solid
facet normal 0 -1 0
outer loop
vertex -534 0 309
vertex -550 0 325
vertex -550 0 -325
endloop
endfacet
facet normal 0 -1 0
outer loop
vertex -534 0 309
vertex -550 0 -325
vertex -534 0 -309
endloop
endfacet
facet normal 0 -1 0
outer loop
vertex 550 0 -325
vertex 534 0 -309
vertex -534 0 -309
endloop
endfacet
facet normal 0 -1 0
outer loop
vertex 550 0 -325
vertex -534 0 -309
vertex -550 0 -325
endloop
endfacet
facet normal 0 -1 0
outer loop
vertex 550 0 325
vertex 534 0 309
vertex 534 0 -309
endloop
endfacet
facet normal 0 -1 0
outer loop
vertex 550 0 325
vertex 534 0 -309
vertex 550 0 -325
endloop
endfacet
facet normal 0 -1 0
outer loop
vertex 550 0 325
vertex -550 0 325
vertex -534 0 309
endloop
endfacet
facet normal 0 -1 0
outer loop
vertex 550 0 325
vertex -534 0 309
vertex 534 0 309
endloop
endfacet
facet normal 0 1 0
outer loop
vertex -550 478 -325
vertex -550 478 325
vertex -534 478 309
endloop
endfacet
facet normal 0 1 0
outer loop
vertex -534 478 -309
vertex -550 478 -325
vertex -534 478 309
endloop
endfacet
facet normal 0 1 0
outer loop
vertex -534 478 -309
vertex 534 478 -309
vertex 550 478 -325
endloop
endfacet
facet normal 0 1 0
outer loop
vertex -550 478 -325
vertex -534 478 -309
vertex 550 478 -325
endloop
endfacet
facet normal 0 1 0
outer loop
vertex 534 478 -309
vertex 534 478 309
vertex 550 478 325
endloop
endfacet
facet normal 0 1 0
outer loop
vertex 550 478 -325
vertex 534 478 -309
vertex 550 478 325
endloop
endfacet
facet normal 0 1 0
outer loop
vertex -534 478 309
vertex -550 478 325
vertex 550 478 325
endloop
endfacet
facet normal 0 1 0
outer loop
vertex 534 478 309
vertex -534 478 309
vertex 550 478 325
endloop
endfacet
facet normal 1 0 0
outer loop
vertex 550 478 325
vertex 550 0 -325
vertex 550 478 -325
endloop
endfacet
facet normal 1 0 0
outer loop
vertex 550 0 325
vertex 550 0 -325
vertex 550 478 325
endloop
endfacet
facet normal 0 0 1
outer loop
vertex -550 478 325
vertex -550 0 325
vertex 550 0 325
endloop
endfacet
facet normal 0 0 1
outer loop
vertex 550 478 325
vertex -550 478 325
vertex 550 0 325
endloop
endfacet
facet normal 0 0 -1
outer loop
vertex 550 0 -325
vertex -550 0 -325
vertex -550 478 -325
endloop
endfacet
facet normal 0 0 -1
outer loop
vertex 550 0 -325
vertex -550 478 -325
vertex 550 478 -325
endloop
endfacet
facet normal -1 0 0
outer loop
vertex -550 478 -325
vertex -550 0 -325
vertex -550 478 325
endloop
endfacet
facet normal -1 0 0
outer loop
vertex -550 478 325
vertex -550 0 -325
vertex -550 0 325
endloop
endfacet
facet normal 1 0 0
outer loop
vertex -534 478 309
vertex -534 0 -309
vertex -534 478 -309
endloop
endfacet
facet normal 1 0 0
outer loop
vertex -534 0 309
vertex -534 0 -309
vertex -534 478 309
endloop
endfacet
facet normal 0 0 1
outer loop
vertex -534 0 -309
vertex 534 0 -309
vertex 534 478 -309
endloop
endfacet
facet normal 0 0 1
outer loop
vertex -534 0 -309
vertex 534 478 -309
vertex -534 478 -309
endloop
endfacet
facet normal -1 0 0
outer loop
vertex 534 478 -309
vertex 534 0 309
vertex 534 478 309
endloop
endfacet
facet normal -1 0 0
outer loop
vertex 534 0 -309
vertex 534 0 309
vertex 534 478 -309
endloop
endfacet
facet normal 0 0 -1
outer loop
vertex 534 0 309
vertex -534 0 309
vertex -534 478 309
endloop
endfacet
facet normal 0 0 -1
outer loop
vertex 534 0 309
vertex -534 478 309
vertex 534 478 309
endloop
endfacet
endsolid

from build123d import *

# Parameters (mm, degrees)
F0_W     = 1100
F0_H     = 650
F1_DEPTH = 478


with BuildPart() as f1:
    # F0 (on Front) → F1 (new body)
    with BuildSketch(Plane.XZ):
        Rectangle(F0_W, F0_H)
        Polygon((-534, 103), (-534, 309), (-234, 309), (-218, 309), (-202, 309), (202, 309), (218, 309), (234, 309), (534, 309), (534, 103), (534, -103), (534, -309), (234, -309), (218, -309), (202, -309), (-202, -309), (-218, -309), (-234, -309), (-534, -309), (-534, -103), align=None, mode=Mode.SUBTRACT)
    extrude(amount=-F1_DEPTH)


solid = f1.part
